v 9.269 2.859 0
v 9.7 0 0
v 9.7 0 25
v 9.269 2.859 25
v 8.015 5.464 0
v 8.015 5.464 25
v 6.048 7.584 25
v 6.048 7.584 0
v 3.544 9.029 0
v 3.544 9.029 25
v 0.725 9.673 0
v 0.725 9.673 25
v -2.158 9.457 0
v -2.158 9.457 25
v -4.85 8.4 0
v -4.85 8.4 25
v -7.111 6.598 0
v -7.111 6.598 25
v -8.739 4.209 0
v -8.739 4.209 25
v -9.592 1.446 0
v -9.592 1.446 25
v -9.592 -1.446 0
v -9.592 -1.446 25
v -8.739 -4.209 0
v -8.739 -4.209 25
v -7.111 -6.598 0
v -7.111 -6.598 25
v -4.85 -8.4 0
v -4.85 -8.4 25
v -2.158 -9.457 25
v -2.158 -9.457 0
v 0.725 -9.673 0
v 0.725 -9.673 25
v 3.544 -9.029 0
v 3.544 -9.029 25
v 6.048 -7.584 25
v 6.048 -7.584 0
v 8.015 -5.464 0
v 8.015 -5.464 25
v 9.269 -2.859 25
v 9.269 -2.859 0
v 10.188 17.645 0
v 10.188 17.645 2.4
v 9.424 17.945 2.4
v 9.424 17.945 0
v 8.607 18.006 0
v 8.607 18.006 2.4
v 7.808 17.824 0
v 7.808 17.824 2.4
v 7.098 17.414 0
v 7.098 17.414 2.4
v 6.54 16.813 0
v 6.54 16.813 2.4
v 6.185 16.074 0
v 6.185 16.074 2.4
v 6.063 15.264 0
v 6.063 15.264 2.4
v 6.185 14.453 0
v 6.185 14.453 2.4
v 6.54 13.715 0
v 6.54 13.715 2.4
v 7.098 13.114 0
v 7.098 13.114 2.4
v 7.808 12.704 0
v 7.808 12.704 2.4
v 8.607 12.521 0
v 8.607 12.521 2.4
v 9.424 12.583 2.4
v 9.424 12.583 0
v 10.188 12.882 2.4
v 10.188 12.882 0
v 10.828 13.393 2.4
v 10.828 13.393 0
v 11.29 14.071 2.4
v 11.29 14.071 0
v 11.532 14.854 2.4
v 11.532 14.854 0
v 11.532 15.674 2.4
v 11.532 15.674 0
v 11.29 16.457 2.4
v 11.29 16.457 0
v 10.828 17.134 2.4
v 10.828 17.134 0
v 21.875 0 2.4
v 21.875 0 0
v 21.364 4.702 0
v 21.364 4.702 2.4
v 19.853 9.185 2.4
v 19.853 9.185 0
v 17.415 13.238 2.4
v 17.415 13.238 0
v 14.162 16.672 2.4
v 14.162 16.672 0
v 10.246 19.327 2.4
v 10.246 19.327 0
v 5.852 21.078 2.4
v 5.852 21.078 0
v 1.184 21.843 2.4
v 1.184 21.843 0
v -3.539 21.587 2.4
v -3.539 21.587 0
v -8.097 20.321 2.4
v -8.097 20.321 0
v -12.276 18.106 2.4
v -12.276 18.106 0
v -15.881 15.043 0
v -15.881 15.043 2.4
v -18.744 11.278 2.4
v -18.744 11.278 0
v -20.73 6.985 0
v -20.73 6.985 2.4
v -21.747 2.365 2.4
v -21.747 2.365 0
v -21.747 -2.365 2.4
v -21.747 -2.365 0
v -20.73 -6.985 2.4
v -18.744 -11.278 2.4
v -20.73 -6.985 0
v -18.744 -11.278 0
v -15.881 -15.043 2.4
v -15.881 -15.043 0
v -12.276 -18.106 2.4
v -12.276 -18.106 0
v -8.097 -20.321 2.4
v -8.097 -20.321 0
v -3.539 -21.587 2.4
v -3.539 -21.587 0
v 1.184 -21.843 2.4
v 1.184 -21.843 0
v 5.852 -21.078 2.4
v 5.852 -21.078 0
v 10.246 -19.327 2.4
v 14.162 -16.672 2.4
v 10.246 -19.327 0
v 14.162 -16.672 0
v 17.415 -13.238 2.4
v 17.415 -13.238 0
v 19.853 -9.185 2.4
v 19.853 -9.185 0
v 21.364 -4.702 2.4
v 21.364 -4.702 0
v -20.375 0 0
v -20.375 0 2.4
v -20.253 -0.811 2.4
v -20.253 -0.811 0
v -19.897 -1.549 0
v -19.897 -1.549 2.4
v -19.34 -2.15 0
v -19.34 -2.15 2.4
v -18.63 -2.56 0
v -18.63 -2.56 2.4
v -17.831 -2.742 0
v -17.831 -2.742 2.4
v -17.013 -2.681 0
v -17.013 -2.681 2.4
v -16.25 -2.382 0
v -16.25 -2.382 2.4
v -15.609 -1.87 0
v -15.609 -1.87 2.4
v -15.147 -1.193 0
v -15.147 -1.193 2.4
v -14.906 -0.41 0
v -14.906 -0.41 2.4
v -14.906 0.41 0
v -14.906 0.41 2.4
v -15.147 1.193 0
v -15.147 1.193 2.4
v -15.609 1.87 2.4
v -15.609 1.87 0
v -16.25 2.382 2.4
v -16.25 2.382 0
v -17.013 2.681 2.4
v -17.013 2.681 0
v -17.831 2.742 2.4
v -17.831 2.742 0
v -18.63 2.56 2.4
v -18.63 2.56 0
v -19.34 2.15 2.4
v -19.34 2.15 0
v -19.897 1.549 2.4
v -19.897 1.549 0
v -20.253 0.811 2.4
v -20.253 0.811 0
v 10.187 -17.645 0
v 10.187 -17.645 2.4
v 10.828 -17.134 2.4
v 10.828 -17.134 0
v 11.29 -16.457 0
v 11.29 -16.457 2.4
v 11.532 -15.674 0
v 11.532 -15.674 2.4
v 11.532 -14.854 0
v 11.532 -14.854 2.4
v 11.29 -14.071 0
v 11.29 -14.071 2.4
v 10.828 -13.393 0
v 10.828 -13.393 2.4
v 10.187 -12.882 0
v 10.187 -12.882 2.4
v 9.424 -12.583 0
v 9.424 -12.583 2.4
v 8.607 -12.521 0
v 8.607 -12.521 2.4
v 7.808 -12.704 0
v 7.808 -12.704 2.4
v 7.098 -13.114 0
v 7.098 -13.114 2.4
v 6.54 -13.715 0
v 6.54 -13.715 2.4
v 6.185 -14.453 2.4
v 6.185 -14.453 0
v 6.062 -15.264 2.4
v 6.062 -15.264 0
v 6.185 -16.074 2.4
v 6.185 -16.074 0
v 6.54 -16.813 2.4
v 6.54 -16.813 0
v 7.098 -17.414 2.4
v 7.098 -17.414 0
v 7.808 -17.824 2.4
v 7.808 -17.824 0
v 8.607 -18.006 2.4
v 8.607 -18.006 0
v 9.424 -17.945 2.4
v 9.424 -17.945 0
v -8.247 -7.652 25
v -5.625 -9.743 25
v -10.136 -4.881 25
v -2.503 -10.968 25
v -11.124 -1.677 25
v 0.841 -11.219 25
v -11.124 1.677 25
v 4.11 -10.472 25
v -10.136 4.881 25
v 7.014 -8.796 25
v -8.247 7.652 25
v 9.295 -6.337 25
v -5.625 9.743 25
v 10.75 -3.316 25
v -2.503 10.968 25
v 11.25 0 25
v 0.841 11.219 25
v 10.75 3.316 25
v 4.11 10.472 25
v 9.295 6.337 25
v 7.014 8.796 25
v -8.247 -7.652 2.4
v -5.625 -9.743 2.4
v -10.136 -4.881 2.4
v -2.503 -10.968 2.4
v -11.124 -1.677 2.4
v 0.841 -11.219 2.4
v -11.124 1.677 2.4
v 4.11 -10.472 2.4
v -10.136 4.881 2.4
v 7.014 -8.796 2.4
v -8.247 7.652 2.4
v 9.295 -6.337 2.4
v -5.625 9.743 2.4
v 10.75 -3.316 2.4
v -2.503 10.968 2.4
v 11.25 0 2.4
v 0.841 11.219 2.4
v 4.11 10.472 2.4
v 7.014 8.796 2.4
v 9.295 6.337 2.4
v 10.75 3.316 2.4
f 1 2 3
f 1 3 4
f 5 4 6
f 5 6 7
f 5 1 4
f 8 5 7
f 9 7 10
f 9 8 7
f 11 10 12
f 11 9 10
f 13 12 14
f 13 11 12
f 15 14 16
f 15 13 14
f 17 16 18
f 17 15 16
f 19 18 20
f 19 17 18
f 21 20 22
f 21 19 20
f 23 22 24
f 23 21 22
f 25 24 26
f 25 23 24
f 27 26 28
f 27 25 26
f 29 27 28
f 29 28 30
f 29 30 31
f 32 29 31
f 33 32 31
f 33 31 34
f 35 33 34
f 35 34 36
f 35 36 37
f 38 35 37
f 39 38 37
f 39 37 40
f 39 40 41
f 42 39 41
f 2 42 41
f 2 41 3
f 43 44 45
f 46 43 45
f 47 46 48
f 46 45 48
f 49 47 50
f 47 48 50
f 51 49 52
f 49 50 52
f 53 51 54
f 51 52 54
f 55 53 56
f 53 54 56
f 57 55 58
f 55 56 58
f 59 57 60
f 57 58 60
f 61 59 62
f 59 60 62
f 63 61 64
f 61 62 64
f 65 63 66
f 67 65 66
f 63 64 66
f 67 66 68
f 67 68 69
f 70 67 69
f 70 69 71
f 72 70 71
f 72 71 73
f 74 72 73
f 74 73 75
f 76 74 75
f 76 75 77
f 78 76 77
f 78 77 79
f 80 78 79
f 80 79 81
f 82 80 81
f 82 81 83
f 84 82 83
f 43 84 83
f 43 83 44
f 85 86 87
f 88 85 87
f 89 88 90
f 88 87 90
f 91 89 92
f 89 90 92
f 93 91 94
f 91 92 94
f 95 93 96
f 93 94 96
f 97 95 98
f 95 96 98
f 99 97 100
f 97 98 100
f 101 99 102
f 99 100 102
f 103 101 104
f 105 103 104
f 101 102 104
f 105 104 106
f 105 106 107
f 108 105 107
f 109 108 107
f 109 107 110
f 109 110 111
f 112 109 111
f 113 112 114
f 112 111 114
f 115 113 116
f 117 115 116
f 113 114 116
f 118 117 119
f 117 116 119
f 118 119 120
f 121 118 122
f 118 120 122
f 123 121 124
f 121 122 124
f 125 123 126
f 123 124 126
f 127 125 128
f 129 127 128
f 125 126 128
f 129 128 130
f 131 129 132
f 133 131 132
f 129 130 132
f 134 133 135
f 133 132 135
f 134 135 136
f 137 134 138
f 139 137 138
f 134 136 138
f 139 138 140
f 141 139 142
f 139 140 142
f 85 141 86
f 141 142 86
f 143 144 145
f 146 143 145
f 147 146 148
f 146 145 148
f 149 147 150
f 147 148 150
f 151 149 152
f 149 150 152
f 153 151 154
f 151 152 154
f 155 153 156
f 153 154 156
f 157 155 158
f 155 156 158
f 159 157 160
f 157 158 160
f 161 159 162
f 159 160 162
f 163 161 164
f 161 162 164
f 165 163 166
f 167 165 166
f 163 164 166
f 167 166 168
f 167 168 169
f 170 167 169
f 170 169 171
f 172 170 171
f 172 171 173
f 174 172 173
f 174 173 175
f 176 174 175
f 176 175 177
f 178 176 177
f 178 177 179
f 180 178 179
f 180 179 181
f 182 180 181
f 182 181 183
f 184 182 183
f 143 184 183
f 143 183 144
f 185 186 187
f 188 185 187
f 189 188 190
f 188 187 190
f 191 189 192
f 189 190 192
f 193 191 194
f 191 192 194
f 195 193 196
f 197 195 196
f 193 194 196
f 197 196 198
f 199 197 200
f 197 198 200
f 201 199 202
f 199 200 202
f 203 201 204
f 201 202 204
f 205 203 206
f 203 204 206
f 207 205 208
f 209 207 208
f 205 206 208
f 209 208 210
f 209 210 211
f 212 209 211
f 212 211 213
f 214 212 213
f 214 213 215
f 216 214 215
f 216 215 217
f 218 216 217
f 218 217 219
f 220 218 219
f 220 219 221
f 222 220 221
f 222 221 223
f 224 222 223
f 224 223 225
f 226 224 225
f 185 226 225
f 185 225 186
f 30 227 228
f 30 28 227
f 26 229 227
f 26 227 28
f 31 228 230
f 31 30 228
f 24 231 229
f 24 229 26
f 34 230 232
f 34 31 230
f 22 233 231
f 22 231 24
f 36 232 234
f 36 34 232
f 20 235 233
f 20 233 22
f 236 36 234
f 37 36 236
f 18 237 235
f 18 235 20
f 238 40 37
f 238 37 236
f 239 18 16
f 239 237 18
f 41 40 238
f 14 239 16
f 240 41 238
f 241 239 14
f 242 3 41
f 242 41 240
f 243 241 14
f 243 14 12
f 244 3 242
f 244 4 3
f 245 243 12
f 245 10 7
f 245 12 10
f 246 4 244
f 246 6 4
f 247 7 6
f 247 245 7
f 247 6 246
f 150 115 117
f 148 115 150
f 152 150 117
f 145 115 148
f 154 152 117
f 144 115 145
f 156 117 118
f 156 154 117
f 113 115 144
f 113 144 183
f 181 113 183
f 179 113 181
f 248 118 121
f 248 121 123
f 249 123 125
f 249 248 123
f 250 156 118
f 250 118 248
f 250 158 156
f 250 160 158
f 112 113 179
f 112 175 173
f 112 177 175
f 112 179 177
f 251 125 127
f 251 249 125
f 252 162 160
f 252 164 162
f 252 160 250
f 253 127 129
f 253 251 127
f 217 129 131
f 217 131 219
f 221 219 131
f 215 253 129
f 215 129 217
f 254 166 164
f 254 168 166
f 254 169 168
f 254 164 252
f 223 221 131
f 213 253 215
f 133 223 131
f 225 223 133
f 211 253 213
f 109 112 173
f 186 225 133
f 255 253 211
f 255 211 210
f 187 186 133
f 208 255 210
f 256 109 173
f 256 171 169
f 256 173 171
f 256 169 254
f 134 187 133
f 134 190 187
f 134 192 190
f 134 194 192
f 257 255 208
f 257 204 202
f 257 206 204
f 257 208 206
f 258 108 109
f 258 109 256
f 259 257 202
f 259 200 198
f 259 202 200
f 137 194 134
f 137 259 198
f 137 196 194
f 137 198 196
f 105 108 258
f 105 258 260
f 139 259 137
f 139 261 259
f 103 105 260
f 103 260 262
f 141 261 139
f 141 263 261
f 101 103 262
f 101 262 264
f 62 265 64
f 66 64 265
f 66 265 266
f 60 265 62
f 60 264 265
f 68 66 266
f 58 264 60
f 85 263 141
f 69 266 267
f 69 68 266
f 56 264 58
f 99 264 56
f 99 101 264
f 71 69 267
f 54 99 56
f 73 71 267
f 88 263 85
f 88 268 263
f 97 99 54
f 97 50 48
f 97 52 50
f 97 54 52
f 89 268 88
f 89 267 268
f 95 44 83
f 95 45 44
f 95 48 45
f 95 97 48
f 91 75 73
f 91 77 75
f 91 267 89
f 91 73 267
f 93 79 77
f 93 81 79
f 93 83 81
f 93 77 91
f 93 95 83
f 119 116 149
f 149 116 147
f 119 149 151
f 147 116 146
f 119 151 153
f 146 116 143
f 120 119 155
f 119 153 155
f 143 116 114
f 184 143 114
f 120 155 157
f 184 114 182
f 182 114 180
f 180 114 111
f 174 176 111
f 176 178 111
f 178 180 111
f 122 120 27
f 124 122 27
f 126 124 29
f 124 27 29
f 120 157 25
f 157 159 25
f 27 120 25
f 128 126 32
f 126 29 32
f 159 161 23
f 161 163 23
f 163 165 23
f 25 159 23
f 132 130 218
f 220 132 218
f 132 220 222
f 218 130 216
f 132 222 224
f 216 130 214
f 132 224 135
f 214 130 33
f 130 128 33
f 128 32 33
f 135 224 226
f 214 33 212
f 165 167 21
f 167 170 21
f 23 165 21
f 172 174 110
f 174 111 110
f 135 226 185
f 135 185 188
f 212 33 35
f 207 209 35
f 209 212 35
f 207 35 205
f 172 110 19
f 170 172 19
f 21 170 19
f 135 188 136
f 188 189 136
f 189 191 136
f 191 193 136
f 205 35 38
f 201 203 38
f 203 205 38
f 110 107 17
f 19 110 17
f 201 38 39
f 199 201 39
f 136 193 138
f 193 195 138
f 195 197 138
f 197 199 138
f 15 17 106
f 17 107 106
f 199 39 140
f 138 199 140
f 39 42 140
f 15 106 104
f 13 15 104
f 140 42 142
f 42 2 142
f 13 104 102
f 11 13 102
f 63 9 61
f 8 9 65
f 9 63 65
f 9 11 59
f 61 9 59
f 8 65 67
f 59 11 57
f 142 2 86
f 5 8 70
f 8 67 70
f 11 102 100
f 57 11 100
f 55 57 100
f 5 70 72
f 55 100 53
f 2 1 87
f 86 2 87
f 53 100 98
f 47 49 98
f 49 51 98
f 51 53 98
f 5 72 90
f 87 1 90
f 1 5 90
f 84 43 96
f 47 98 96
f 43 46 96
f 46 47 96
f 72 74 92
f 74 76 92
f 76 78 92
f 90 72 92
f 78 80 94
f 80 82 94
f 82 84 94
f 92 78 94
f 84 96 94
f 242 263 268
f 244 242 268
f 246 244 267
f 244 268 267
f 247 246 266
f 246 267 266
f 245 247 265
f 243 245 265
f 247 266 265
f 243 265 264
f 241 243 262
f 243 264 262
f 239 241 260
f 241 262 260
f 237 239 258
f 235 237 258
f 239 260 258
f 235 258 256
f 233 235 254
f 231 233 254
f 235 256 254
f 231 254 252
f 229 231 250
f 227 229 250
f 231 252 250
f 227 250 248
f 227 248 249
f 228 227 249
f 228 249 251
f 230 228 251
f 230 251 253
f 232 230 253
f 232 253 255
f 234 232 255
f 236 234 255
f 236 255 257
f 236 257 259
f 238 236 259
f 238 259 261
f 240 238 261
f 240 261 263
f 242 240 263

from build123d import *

# Parameters (mm, degrees)
F0_R            = 21.875
F0_R_2          = 11.25
F0_R_3          = 9.7
F1_DEPTH        = 2.4
F2_DEPTH        = 25
F3_D            = 5.5
F3_COPIES_COUNT = 3


# Not quite as in the source:
# - a pattern or mirror of a feature is missing from the dataset's text; its kind, count and spacing are read off the source's solid


with BuildPart() as f1:
    # F0 (on Top) → F1 (new body)
    with BuildSketch(Plane.XY):
        Circle(F0_R)
        Circle(F0_R_2, mode=Mode.SUBTRACT)
        Circle(F0_R_2)
        Circle(F0_R_3, mode=Mode.SUBTRACT)
    extrude(amount=F1_DEPTH)

    # F0 (on Top) → F2 (join)
    with BuildSketch(Plane.XY):
        Circle(F0_R_2)
        Circle(F0_R_3, mode=Mode.SUBTRACT)
    extrude(amount=F2_DEPTH)

    # F3 (through all)
    with Locations(Plane(origin=(0, 0, 0), x_dir=(1, 0, 0), z_dir=(0, 0, -1))):
        with Locations((-17.625, 0)):
            f3 = Hole(F3_D / 2)

    # F3_copies: F3 ×3 about axis
    f3_copies_axis = Axis((0, 0, 0), (0, 0, 1))
    for i in range(1, F3_COPIES_COUNT):
        add(f3.rotate(f3_copies_axis, i * 360 / F3_COPIES_COUNT), mode=Mode.SUBTRACT)


solid = f1.part
